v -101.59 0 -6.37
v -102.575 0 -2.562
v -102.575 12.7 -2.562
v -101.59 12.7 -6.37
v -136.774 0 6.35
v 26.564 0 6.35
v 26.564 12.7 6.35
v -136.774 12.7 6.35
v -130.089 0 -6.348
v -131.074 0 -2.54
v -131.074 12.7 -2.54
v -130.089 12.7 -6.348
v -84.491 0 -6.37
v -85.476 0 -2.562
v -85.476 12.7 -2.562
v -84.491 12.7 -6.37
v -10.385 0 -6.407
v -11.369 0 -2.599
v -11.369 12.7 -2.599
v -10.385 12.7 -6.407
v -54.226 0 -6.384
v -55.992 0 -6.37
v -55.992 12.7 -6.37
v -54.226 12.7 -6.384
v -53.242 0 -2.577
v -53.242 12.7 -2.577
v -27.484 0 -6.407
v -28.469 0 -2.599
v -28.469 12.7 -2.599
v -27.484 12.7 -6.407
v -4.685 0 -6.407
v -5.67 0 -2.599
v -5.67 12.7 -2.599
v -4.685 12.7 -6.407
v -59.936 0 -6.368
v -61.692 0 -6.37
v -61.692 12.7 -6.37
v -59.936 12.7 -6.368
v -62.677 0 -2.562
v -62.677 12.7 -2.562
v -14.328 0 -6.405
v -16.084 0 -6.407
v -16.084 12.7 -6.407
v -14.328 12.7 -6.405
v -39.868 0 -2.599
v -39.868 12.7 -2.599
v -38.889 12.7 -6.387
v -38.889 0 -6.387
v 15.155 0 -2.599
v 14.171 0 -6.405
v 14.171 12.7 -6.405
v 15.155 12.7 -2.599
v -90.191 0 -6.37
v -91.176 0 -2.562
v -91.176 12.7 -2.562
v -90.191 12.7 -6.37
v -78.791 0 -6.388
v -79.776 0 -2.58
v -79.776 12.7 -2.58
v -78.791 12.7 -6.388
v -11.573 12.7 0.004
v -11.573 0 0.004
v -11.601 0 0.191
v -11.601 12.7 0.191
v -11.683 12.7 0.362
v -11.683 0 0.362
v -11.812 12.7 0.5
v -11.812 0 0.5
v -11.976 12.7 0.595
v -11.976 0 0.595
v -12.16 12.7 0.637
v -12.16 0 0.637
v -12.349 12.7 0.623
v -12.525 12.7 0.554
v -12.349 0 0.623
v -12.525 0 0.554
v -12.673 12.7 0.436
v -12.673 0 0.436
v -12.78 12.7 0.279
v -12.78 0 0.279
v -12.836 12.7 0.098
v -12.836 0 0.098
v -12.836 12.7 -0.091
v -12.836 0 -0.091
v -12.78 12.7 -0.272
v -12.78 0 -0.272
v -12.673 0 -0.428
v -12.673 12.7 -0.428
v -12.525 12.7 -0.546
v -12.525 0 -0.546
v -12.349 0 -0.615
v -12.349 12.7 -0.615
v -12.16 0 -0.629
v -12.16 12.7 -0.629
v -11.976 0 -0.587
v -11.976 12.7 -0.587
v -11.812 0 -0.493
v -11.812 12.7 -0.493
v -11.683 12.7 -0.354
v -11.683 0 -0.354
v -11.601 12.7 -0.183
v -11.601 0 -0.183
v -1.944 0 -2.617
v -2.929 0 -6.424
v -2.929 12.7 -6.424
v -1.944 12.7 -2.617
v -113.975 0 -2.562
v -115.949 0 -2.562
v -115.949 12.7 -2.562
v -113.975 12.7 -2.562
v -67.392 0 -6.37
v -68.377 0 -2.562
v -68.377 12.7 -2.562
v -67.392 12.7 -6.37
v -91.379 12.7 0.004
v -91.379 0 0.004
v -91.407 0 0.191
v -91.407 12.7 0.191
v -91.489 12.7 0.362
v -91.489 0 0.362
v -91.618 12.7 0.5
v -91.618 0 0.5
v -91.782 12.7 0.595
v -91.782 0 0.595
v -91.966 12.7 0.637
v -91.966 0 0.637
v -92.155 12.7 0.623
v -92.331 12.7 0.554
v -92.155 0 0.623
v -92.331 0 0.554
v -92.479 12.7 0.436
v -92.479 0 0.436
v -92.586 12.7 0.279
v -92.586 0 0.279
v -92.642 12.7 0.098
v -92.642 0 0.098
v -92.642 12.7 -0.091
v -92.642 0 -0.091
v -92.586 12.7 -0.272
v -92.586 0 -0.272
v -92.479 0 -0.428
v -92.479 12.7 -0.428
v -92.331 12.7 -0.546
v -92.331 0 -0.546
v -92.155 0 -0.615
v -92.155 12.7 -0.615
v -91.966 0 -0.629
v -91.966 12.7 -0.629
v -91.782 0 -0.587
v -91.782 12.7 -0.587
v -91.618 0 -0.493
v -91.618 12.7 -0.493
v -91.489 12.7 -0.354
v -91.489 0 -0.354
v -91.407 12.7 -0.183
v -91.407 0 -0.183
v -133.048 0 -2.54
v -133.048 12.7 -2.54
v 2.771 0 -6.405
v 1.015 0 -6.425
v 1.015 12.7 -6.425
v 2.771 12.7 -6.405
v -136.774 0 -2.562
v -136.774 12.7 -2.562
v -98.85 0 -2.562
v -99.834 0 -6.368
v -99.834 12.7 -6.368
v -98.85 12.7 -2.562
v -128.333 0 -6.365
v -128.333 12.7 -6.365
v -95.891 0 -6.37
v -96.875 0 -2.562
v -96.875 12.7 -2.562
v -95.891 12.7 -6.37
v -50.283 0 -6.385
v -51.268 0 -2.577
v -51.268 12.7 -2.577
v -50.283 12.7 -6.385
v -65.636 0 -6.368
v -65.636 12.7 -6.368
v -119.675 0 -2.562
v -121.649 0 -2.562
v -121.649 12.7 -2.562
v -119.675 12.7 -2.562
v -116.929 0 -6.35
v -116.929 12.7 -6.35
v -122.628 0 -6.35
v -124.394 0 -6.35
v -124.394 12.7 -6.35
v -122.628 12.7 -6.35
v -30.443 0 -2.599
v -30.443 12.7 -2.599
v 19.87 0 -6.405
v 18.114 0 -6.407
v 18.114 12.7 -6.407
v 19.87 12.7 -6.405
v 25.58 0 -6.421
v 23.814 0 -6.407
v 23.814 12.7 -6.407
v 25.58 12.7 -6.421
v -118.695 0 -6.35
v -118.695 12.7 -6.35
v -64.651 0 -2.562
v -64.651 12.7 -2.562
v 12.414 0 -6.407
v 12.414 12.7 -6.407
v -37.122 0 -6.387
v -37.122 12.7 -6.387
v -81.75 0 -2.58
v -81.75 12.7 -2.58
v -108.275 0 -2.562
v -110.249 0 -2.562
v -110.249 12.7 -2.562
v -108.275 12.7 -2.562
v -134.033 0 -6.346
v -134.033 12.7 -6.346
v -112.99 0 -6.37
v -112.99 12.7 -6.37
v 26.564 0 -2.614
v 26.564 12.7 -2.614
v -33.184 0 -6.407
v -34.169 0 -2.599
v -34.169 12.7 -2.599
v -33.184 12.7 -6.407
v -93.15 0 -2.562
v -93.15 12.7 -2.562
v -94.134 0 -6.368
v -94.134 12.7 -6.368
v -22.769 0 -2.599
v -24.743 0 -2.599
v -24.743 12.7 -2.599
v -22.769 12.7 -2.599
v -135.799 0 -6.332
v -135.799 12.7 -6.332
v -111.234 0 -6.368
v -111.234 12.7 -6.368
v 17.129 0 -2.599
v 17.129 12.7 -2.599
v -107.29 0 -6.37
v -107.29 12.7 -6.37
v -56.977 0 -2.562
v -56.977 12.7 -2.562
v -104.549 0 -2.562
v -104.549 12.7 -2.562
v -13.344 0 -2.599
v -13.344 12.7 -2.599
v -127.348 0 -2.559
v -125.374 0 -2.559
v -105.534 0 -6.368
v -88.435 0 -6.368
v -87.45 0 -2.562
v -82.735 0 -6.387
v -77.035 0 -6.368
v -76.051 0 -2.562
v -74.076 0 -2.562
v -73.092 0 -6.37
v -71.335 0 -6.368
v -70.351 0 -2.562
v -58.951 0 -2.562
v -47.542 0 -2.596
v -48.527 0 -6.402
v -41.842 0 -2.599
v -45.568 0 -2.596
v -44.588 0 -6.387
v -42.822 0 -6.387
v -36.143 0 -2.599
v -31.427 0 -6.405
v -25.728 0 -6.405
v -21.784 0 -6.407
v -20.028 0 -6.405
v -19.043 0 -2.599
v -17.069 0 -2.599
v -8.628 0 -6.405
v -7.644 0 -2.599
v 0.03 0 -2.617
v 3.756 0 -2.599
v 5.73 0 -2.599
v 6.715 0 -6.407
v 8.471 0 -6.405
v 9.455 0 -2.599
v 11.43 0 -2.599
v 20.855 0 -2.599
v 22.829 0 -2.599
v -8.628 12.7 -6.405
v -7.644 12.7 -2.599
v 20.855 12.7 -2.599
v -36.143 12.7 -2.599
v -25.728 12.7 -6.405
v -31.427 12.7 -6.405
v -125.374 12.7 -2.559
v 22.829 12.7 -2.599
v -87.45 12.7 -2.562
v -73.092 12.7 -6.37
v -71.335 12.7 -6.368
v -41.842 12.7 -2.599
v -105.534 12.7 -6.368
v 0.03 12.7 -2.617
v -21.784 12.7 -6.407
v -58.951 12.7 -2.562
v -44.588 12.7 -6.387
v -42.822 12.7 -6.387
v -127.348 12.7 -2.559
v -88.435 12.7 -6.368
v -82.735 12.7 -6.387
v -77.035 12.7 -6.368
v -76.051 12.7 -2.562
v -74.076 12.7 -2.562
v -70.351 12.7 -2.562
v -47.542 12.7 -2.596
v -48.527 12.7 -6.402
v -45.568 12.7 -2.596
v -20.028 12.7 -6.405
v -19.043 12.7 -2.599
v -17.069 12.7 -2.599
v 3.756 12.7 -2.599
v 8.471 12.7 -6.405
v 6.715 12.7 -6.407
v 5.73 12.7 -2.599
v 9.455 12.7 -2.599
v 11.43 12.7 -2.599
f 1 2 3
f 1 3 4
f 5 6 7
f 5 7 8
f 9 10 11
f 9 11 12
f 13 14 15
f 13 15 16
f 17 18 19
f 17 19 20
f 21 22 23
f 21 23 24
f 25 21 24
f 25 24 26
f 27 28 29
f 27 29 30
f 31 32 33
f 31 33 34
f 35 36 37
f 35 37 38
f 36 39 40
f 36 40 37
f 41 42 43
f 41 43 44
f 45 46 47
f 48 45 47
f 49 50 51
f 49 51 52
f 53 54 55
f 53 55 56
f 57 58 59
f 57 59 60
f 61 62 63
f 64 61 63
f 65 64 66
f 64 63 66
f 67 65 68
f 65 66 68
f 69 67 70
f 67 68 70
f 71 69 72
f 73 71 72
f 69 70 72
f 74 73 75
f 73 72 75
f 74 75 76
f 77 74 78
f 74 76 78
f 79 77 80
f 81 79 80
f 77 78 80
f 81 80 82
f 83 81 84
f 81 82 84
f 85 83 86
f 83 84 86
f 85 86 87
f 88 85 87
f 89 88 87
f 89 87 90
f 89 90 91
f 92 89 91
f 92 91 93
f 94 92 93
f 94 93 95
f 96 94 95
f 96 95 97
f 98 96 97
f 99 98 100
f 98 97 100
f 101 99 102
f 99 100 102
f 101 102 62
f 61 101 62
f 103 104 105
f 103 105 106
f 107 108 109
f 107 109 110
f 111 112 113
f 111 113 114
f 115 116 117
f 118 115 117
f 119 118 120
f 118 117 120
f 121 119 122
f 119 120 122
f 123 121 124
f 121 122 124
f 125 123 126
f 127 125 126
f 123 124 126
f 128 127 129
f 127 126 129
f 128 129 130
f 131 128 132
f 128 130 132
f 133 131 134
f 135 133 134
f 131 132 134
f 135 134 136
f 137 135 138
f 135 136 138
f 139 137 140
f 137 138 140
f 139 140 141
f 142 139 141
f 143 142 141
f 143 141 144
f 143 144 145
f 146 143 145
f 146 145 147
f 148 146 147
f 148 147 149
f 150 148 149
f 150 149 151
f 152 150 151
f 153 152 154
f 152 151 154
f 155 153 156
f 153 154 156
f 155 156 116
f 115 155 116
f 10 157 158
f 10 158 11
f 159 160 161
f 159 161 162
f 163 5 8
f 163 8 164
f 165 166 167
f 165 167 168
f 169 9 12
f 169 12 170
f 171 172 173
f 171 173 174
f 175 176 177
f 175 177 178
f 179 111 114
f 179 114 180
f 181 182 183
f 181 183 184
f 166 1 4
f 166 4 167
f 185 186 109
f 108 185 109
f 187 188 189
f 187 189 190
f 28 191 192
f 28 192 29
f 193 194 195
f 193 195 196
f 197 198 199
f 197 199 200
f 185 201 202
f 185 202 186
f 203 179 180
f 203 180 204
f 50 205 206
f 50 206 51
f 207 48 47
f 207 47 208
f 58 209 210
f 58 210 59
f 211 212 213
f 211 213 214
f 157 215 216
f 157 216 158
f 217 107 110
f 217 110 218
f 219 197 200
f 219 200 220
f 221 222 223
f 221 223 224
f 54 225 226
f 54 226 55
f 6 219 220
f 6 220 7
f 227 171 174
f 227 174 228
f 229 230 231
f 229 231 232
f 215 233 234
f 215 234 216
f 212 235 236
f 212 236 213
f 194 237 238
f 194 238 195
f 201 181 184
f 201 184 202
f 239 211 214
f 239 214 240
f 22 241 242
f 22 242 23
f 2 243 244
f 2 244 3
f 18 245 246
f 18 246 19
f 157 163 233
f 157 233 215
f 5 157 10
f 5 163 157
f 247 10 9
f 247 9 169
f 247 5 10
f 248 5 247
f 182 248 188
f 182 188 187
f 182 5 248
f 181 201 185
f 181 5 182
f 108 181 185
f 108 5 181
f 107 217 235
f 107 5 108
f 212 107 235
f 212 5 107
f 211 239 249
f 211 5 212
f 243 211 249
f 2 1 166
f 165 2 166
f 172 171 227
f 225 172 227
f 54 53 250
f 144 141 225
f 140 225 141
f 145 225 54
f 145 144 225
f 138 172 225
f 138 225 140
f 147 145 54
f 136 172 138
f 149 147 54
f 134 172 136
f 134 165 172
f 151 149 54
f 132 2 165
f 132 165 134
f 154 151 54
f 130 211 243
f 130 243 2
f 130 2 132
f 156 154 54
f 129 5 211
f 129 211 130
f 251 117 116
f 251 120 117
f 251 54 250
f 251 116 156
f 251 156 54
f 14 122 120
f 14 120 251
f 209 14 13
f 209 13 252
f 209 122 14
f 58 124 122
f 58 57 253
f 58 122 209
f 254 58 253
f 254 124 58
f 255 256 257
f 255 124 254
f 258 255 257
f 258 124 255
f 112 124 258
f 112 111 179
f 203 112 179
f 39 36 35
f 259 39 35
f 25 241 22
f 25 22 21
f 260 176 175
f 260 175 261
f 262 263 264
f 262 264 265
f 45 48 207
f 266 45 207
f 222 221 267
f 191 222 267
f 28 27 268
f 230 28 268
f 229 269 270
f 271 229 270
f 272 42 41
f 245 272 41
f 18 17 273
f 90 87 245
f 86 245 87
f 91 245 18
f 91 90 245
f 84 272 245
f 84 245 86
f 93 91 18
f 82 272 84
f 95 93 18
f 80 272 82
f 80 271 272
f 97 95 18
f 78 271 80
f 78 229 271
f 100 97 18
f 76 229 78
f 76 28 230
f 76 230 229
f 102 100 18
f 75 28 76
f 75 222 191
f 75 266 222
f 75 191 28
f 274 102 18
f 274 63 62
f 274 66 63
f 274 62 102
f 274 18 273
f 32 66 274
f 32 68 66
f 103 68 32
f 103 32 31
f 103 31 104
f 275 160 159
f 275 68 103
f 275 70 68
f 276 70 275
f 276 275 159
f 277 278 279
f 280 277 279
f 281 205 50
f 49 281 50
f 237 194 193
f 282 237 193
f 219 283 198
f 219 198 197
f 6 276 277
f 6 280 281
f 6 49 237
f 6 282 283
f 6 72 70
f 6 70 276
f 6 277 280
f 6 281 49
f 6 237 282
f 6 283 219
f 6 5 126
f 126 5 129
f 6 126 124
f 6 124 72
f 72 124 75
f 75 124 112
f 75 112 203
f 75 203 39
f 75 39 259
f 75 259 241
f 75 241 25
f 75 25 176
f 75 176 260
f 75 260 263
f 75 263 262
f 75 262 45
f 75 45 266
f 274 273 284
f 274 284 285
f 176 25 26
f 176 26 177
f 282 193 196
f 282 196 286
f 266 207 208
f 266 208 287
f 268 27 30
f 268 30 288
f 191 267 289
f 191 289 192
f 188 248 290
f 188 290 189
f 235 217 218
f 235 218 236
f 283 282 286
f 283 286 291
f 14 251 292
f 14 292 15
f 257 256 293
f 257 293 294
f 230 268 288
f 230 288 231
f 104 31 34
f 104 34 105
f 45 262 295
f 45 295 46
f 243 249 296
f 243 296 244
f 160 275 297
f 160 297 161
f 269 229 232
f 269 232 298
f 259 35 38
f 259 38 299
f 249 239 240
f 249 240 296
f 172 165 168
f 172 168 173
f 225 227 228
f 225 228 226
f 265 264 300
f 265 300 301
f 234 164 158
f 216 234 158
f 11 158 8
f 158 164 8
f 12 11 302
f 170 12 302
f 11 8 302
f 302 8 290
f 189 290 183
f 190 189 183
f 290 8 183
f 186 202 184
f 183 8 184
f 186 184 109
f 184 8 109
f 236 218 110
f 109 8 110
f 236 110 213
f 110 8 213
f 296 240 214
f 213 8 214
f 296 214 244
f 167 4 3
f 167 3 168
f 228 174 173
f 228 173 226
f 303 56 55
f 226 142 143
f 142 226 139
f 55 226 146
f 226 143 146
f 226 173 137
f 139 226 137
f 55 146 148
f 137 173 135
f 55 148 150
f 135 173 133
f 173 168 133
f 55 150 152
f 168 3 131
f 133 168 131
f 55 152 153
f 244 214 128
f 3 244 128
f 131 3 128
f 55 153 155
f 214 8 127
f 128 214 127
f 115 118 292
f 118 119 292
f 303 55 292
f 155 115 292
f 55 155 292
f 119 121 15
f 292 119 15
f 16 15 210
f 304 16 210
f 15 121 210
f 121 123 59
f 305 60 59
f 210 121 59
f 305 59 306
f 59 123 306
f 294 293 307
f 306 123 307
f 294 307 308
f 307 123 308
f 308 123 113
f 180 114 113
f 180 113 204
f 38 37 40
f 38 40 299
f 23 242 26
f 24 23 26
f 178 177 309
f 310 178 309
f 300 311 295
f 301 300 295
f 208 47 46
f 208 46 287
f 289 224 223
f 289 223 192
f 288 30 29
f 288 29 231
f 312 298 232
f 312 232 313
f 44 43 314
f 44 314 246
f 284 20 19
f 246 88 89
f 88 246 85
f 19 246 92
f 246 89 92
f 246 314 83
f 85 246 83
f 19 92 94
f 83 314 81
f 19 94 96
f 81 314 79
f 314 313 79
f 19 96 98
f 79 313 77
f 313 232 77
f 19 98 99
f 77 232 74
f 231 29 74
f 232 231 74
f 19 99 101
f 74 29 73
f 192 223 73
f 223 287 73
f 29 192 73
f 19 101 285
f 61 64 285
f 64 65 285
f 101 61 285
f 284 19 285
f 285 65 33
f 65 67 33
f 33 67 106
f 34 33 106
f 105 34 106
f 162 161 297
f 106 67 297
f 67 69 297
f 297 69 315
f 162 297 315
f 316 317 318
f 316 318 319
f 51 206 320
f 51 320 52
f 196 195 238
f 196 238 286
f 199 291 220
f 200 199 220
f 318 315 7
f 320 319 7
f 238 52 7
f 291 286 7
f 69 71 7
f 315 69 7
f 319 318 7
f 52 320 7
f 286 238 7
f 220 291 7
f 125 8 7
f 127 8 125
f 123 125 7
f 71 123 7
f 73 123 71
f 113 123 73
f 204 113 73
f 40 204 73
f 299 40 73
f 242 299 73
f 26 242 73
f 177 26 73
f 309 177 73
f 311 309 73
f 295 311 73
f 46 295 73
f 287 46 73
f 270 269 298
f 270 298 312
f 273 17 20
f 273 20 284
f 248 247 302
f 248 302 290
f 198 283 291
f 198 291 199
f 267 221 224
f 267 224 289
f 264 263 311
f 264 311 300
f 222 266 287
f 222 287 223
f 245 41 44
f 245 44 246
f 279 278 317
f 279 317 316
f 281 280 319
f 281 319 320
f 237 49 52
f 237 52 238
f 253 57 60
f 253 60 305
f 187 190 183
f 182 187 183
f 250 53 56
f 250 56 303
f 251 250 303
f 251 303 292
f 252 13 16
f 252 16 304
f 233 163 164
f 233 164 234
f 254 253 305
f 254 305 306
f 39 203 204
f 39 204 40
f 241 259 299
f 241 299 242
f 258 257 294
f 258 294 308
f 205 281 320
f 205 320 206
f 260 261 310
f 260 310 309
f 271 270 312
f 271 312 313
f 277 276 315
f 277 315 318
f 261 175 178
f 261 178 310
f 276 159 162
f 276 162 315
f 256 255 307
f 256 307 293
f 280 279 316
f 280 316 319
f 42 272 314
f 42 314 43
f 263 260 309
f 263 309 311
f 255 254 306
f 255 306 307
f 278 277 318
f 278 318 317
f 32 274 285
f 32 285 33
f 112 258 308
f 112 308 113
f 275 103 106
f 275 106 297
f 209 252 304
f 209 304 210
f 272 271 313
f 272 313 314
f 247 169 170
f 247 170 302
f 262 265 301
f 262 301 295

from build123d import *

# Parameters (mm, degrees)
F0_R     = 0.635
F1_DEPTH = 12.7


# Not quite as in the source:
# - a feature of the source that left no trace in its solid (it failed there, or was rolled back) is left out


with BuildPart() as f1:
    # F0 (on Front) → F1 (new body)
    with BuildSketch(Plane.XZ):
        Polygon((26.5642398671, -2.6142263417), (26.5642398671, 6.35), (-136.7738045981, 6.35), (-136.7738045981, -2.5616034378), (-135.7986113058, -6.3323961114), (-134.0326395944, -6.346404838), (-133.0482363701, -2.54), (-131.0740445981, -2.54), (-130.0892531872, -6.3479058444), (-128.3328795944, -6.3651881602), (-127.3484763701, -2.5587833222), (-125.3742845981, -2.5587833222), (-124.3938092991, -6.35), (-122.6284623376, -6.35), (-121.6487163701, -2.5616034378), (-119.6745245981, -2.5616034378), (-118.6947786306, -6.35), (-116.9287023376, -6.35), (-115.9489563701, -2.5616034378), (-113.9747645981, -2.5616034378), (-112.9899731872, -6.3695092822), (-111.2335995944, -6.3680082758), (-110.2491963701, -2.5616034378), (-108.2750045981, -2.5616034378), (-107.2902131872, -6.3695092822), (-105.5338395944, -6.3680082758), (-104.5494363701, -2.5616034378), (-102.5752445981, -2.5616034378), (-101.5904531872, -6.3695092822), (-99.8340795944, -6.3680082758), (-98.8496763701, -2.5616034378), (-96.8754845981, -2.5616034378), (-95.8906931872, -6.3695092822), (-94.1343195944, -6.3680082758), (-93.1499163701, -2.5616034378), (-91.1757245981, -2.5616034378), (-90.1909331872, -6.3695092822), (-88.4345595944, -6.3680082758), (-87.4501563701, -2.5616034378), (-85.4759645981, -2.5616034378), (-84.4911731872, -6.3695092822), (-82.7347995944, -6.386791598), (-81.7503963701, -2.58038676), (-79.7762045981, -2.58038676), (-78.7914131872, -6.3882926044), (-77.0350395944, -6.3680082758), (-76.0506363701, -2.5616034378), (-74.0764445981, -2.5616034378), (-73.0916531872, -6.3695092822), (-71.3352795944, -6.3680082758), (-70.3508763701, -2.5616034378), (-68.3766845981, -2.5616034378), (-67.3918931872, -6.3695092822), (-65.6355195944, -6.3680082758), (-64.6511163701, -2.5616034378), (-62.6769245981, -2.5616034378), (-61.6921331872, -6.3695092822), (-59.9357595944, -6.3680082758), (-58.9513563701, -2.5616034378), (-56.9771645981, -2.5616034378), (-55.9923731872, -6.3695092822), (-54.2264014758, -6.3835180088), (-53.2419982515, -2.5771131708), (-51.2678064795, -2.5771131708), (-50.2830150686, -6.3850190153), (-48.5266414758, -6.402301331), (-47.5422382515, -2.595896493), (-45.5680464795, -2.595896493), (-44.5875711805, -6.3871131708), (-42.822224219, -6.3871131708), (-41.8424782515, -2.5987166086), (-39.8682864795, -2.5987166086), (-38.888540512, -6.3871131708), (-37.122464219, -6.3871131708), (-36.1427182515, -2.5987166086), (-34.1685264795, -2.5987166086), (-33.1837350686, -6.4066224531), (-31.4273614758, -6.4051214466), (-30.4429582515, -2.5987166086), (-28.4687664795, -2.5987166086), (-27.4839750686, -6.4066224531), (-25.7276014758, -6.4051214466), (-24.7431982515, -2.5987166086), (-22.7690064795, -2.5987166086), (-21.7842150686, -6.4066224531), (-20.0278414758, -6.4051214466), (-19.0434382515, -2.5987166086), (-17.0692464795, -2.5987166086), (-16.0844550686, -6.4066224531), (-14.3280814758, -6.4051214466), (-13.3436782515, -2.5987166086), (-11.3694864795, -2.5987166086), (-10.3846950686, -6.4066224531), (-8.6283214758, -6.4051214466), (-7.6439182515, -2.5987166086), (-5.6697264795, -2.5987166086), (-4.6849350686, -6.4066224531), (-2.9285614758, -6.4239047688), (-1.9441582515, -2.6174999308), (0.0300335205, -2.6174999308), (1.0148249314, -6.4254057753), (2.7711985242, -6.4051214466), (3.7556017485, -2.5987166086), (5.7297935205, -2.5987166086), (6.7145849314, -6.4066224531), (8.4709585242, -6.4051214466), (9.4553617485, -2.5987166086), (11.4295535205, -2.5987166086), (12.4143449314, -6.4066224531), (14.1707185242, -6.4051214466), (15.1551217485, -2.5987166086), (17.1293135205, -2.5987166086), (18.1141049314, -6.4066224531), (19.8704785242, -6.4051214466), (20.8548817485, -2.5987166086), (22.8290735205, -2.5987166086), (23.8138649314, -6.4066224531), (25.5798366429, -6.4206311797), align=None)
        with Locations((-92.0139178634, 0.0037964069)):
            Circle(F0_R, mode=Mode.SUBTRACT)
        with Locations((-12.2076766565, 0.0037964069)):
            Circle(F0_R, mode=Mode.SUBTRACT)
    extrude(amount=-F1_DEPTH)


solid = f1.part
